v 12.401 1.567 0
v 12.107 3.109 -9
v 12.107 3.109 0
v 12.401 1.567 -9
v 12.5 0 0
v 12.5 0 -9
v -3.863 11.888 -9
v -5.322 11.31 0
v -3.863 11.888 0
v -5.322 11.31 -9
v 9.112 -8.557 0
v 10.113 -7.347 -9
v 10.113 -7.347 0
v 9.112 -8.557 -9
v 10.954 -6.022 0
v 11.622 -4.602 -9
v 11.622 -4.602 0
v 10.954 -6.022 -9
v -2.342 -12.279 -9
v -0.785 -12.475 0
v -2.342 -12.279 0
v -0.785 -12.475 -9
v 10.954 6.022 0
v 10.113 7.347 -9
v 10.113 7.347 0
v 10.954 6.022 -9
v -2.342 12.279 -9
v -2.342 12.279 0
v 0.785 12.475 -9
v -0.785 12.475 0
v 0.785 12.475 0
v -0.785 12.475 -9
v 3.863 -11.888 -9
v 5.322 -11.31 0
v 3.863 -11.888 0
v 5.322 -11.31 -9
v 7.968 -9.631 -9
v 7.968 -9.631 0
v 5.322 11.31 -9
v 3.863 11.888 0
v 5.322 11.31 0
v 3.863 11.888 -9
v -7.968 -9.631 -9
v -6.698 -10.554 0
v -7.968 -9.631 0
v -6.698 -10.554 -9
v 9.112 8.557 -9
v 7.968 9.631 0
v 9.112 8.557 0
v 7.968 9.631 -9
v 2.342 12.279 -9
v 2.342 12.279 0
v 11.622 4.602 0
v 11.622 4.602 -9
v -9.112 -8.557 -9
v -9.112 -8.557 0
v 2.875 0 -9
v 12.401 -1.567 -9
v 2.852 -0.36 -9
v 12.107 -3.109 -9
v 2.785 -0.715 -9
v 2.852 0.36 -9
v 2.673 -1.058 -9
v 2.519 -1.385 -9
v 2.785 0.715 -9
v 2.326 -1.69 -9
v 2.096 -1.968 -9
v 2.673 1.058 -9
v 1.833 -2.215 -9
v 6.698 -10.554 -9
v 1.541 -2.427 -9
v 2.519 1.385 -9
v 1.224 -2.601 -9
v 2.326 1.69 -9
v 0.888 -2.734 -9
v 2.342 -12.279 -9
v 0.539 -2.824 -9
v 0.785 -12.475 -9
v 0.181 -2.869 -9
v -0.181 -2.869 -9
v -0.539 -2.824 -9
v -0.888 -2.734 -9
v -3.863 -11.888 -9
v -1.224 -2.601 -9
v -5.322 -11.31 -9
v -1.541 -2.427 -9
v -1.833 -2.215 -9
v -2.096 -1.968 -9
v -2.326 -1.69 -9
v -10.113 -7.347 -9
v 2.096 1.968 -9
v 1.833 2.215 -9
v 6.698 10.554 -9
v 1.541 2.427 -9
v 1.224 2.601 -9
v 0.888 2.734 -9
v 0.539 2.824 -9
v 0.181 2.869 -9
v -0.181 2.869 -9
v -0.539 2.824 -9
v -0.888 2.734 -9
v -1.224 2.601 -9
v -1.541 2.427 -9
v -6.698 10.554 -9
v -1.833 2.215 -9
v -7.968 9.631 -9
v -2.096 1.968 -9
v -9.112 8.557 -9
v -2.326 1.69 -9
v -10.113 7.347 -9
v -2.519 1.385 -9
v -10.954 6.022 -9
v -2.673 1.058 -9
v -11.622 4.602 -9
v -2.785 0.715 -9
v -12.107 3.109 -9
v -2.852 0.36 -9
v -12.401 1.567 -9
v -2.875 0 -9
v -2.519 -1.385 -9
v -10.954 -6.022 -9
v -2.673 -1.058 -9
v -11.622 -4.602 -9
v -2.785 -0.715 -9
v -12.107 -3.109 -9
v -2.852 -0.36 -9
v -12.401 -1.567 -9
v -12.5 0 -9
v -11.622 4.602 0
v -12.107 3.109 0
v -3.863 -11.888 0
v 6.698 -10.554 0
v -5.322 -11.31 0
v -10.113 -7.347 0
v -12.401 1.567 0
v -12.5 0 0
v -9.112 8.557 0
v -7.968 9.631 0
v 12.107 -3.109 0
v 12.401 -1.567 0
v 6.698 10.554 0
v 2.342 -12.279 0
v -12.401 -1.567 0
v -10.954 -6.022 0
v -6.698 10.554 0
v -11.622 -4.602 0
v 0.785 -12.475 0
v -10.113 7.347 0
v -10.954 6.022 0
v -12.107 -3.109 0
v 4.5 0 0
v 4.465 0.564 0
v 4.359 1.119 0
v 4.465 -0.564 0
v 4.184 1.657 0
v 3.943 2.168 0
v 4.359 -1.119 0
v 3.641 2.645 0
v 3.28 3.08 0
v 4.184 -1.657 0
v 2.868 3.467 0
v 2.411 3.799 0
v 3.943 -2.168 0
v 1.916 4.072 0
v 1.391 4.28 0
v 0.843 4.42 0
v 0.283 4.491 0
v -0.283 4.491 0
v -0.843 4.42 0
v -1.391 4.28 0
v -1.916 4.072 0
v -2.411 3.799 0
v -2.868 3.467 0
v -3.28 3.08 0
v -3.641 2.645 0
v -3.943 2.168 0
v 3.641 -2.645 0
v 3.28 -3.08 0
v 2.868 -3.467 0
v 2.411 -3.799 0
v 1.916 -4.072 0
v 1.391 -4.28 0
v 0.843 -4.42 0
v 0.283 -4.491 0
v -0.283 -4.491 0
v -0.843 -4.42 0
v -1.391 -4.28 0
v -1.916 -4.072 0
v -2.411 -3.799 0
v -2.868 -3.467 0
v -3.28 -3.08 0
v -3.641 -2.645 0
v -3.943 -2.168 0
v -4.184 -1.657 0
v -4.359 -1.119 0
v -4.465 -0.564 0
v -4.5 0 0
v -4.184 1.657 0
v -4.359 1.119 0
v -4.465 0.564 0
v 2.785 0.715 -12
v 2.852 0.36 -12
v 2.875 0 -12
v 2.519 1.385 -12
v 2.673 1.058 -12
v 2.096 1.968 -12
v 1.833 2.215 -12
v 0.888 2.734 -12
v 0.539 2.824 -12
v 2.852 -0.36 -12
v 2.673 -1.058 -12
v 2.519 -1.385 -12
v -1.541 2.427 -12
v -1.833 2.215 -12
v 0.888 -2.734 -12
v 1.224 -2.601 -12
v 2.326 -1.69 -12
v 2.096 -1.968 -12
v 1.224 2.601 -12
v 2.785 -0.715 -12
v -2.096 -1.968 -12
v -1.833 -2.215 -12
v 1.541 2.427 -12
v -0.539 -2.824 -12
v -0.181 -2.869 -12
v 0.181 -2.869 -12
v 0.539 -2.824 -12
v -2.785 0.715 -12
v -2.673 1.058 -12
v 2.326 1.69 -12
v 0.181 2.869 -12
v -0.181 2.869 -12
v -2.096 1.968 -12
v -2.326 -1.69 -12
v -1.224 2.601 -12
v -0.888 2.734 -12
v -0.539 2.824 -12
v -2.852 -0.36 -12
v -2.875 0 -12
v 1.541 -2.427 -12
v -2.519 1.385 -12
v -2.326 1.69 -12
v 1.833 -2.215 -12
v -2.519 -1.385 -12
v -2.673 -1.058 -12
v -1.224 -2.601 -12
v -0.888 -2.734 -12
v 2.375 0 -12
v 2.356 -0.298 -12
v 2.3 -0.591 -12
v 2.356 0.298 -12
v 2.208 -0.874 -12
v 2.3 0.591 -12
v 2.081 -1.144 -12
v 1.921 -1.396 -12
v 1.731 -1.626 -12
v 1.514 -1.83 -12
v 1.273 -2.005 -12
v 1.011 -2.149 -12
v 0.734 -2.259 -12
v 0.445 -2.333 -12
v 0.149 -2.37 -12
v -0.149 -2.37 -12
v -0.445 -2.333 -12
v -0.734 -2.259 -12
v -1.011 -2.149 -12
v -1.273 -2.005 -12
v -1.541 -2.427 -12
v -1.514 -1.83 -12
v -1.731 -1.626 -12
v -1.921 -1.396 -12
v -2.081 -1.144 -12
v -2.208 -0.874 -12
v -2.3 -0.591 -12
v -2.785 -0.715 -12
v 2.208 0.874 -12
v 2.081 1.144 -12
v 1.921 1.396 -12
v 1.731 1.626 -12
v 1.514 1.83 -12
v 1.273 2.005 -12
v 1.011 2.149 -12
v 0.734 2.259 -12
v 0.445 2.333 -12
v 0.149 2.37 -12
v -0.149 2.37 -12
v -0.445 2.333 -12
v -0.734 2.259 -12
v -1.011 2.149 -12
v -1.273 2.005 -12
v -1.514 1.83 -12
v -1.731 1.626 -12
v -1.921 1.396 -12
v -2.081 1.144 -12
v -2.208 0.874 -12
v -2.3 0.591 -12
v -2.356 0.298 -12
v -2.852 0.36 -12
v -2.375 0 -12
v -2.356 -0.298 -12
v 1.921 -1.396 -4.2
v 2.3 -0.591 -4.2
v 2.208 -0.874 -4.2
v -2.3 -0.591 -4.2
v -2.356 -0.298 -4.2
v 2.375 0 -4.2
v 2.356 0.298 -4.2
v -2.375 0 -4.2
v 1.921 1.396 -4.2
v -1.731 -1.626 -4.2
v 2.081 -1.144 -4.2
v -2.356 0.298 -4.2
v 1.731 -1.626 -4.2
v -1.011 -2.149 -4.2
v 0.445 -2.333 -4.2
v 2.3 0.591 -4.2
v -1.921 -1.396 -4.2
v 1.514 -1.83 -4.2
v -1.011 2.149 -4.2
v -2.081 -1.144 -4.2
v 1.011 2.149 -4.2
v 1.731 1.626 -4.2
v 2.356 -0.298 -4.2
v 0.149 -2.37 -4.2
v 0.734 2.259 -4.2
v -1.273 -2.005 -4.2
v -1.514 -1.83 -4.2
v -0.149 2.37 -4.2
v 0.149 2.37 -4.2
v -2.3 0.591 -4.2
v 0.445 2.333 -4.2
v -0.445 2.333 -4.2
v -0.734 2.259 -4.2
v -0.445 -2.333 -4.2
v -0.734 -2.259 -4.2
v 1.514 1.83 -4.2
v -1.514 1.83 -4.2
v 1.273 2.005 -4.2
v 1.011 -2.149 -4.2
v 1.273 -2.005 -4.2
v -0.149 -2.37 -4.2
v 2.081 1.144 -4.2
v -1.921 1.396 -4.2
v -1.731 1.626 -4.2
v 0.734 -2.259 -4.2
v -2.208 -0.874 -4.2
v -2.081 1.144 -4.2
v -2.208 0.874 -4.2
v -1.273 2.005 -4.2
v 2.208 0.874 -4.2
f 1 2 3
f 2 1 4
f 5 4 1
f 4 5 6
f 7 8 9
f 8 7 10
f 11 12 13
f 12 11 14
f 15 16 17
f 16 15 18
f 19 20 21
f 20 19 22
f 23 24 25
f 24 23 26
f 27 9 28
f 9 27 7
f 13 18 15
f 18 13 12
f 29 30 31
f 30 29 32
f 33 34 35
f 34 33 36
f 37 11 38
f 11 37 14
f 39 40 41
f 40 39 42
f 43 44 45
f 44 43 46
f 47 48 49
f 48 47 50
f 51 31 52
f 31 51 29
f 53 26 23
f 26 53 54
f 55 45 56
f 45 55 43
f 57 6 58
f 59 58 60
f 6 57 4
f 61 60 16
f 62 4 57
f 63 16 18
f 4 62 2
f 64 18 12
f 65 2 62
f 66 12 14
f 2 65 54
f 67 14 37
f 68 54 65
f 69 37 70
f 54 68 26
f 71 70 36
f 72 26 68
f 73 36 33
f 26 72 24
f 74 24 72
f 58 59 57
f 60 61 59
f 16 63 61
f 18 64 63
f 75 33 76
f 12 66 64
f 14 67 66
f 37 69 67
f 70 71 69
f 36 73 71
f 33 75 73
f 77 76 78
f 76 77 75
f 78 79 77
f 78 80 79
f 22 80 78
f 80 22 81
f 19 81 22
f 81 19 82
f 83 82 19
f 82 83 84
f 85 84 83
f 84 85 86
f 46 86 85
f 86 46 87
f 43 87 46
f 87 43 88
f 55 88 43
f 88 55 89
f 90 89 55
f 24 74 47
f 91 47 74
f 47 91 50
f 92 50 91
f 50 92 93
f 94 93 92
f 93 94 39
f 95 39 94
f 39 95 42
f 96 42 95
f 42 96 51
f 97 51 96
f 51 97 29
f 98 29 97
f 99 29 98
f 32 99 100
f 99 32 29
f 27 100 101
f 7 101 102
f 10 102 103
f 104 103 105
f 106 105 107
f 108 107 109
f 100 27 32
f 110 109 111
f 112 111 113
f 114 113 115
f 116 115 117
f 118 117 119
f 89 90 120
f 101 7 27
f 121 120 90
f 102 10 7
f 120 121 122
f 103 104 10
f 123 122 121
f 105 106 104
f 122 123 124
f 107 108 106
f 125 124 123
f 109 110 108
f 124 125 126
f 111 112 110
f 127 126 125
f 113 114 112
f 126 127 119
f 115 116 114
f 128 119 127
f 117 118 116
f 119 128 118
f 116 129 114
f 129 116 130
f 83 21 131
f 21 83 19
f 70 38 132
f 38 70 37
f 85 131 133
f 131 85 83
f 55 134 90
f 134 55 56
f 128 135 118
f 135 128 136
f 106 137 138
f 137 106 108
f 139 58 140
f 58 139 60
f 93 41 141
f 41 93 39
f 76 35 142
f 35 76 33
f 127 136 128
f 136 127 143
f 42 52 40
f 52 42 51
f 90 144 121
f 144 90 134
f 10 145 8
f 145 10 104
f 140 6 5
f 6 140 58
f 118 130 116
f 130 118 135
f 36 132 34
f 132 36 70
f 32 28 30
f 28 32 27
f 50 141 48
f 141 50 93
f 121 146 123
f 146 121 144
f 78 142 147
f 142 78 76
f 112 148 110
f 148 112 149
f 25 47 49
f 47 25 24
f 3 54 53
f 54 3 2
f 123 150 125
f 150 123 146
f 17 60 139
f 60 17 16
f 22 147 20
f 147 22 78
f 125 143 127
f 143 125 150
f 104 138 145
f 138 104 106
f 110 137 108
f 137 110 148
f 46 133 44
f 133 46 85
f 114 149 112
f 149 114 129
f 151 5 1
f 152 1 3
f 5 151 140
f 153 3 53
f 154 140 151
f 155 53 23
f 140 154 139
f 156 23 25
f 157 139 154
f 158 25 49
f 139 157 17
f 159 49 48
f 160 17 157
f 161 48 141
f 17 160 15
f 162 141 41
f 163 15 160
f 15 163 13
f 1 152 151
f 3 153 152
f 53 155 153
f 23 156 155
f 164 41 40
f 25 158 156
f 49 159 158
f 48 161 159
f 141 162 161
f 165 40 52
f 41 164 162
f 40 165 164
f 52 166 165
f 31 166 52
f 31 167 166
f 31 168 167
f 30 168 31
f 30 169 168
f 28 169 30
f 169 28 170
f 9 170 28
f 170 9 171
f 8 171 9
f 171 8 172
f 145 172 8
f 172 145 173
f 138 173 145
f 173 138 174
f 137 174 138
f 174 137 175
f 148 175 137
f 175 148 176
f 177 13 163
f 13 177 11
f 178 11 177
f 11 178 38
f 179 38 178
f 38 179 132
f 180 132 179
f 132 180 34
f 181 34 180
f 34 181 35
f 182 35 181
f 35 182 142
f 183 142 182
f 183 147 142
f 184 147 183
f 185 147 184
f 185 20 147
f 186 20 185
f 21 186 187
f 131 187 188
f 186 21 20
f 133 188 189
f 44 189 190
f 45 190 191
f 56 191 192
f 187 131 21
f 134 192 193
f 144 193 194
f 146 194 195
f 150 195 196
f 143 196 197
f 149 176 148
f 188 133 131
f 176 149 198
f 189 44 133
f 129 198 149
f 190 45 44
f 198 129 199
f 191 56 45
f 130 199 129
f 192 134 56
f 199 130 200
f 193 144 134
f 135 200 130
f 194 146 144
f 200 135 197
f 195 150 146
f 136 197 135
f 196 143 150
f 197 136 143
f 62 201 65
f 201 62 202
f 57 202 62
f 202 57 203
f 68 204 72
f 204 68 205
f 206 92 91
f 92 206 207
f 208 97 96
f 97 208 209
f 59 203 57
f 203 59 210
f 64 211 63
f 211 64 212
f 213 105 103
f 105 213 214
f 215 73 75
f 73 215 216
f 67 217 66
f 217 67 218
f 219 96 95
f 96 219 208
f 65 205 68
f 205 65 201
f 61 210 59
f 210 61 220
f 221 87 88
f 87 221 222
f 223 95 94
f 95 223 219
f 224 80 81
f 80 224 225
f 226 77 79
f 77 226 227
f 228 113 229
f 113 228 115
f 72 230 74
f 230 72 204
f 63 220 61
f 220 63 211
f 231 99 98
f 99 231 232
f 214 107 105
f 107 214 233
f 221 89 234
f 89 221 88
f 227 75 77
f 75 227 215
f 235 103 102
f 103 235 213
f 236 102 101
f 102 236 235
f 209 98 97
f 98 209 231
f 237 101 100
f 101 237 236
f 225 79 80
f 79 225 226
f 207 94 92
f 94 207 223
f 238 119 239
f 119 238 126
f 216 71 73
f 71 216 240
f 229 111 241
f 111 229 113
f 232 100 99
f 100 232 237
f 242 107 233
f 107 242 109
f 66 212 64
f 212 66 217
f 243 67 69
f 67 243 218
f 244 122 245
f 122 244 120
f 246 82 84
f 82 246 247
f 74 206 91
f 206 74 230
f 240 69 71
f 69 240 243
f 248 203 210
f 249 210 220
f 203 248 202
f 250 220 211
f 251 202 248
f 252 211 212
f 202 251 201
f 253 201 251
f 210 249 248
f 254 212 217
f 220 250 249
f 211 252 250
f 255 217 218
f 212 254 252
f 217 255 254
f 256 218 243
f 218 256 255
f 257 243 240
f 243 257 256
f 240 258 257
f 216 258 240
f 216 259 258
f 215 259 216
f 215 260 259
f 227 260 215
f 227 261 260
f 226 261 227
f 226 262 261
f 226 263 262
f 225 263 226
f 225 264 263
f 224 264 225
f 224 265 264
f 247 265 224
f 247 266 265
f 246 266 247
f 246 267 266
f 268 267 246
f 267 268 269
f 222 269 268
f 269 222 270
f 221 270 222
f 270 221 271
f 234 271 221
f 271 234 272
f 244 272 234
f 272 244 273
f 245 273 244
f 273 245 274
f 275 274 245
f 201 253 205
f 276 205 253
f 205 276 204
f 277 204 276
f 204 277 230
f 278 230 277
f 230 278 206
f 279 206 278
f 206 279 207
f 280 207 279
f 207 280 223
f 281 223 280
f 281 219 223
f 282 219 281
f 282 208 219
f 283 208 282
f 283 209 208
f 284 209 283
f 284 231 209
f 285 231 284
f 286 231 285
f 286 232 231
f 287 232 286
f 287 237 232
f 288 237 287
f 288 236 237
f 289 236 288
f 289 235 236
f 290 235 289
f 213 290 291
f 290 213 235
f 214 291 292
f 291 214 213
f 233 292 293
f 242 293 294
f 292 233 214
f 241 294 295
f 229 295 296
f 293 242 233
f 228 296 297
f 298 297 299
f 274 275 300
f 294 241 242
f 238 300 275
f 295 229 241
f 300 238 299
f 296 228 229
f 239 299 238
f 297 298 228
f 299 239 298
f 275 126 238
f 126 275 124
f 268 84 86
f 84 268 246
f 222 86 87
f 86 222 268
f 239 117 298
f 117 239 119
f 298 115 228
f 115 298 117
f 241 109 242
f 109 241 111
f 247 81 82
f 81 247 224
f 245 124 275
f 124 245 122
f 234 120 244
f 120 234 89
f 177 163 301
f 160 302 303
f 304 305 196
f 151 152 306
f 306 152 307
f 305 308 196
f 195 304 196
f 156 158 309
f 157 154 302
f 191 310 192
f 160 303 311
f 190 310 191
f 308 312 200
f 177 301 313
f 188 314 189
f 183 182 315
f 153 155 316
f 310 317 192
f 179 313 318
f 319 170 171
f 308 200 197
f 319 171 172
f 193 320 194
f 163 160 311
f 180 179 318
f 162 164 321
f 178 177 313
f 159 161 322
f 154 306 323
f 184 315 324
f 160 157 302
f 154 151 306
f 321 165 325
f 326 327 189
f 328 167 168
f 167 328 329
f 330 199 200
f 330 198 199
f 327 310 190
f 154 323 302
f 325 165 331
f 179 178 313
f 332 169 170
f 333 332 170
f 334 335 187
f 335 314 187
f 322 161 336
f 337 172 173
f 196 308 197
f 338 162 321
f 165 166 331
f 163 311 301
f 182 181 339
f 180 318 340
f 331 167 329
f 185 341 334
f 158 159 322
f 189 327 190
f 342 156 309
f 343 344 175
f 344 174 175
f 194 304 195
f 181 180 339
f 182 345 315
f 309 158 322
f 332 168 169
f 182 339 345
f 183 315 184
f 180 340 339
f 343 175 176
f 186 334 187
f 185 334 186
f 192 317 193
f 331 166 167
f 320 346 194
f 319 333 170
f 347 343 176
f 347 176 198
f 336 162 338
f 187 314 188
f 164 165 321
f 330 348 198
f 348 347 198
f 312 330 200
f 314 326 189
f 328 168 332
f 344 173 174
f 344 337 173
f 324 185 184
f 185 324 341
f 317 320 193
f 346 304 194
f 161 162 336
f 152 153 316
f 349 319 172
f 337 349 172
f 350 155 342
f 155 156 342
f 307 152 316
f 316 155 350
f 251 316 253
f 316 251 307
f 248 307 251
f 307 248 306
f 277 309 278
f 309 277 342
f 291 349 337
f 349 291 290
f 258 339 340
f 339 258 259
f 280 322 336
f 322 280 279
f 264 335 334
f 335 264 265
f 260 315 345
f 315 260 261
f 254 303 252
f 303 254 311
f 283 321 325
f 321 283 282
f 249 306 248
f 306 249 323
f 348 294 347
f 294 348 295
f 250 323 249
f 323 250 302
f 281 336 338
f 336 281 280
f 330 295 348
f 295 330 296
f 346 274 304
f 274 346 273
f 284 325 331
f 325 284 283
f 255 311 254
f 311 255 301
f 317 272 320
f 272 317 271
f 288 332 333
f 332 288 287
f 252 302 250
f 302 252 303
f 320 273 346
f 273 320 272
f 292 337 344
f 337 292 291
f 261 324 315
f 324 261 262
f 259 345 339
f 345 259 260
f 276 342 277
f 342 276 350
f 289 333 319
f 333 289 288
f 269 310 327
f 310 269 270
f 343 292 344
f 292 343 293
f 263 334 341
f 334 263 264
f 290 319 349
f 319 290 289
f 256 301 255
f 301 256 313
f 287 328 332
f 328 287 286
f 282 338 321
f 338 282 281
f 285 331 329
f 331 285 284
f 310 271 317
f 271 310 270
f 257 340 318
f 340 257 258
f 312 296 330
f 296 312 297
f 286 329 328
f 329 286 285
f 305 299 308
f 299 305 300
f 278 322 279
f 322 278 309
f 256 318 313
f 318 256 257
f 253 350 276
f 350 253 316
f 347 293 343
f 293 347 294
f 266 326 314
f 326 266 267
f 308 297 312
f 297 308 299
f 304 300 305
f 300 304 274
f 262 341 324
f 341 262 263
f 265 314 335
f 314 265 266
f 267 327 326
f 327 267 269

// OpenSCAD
$fn = 50;

difference() {
	union() {
		translate(v = [0, 0, -9.0]) {
			cylinder(h = 9, r = 12.5);
		}
		#translate(v = [0, 0, -12.0]) {
			cylinder(h = 12, r = 2.875);
		}
	}
	union() {
		translate(v = [0, 0, 0]) {
			rotate(a = [0, 0, 0]) {
				difference() {
					union() {
						translate(v = [0, 0, -12.0]) {
							cylinder(h = 12, r = 2.25);
						}
						translate(v = [0, 0, -4.2]) {
							cylinder(h = 4.2, r1 = 2.375, r2 = 4.5);
						}
						translate(v = [0, 0, -12.0]) {
							cylinder(h = 12, r = 2.375);
						}
						translate(v = [0, 0, -12.0]) {
							cylinder(h = 12, r = 2.25);
						}
					}
					union();
				}
			}
		}
	}
}
